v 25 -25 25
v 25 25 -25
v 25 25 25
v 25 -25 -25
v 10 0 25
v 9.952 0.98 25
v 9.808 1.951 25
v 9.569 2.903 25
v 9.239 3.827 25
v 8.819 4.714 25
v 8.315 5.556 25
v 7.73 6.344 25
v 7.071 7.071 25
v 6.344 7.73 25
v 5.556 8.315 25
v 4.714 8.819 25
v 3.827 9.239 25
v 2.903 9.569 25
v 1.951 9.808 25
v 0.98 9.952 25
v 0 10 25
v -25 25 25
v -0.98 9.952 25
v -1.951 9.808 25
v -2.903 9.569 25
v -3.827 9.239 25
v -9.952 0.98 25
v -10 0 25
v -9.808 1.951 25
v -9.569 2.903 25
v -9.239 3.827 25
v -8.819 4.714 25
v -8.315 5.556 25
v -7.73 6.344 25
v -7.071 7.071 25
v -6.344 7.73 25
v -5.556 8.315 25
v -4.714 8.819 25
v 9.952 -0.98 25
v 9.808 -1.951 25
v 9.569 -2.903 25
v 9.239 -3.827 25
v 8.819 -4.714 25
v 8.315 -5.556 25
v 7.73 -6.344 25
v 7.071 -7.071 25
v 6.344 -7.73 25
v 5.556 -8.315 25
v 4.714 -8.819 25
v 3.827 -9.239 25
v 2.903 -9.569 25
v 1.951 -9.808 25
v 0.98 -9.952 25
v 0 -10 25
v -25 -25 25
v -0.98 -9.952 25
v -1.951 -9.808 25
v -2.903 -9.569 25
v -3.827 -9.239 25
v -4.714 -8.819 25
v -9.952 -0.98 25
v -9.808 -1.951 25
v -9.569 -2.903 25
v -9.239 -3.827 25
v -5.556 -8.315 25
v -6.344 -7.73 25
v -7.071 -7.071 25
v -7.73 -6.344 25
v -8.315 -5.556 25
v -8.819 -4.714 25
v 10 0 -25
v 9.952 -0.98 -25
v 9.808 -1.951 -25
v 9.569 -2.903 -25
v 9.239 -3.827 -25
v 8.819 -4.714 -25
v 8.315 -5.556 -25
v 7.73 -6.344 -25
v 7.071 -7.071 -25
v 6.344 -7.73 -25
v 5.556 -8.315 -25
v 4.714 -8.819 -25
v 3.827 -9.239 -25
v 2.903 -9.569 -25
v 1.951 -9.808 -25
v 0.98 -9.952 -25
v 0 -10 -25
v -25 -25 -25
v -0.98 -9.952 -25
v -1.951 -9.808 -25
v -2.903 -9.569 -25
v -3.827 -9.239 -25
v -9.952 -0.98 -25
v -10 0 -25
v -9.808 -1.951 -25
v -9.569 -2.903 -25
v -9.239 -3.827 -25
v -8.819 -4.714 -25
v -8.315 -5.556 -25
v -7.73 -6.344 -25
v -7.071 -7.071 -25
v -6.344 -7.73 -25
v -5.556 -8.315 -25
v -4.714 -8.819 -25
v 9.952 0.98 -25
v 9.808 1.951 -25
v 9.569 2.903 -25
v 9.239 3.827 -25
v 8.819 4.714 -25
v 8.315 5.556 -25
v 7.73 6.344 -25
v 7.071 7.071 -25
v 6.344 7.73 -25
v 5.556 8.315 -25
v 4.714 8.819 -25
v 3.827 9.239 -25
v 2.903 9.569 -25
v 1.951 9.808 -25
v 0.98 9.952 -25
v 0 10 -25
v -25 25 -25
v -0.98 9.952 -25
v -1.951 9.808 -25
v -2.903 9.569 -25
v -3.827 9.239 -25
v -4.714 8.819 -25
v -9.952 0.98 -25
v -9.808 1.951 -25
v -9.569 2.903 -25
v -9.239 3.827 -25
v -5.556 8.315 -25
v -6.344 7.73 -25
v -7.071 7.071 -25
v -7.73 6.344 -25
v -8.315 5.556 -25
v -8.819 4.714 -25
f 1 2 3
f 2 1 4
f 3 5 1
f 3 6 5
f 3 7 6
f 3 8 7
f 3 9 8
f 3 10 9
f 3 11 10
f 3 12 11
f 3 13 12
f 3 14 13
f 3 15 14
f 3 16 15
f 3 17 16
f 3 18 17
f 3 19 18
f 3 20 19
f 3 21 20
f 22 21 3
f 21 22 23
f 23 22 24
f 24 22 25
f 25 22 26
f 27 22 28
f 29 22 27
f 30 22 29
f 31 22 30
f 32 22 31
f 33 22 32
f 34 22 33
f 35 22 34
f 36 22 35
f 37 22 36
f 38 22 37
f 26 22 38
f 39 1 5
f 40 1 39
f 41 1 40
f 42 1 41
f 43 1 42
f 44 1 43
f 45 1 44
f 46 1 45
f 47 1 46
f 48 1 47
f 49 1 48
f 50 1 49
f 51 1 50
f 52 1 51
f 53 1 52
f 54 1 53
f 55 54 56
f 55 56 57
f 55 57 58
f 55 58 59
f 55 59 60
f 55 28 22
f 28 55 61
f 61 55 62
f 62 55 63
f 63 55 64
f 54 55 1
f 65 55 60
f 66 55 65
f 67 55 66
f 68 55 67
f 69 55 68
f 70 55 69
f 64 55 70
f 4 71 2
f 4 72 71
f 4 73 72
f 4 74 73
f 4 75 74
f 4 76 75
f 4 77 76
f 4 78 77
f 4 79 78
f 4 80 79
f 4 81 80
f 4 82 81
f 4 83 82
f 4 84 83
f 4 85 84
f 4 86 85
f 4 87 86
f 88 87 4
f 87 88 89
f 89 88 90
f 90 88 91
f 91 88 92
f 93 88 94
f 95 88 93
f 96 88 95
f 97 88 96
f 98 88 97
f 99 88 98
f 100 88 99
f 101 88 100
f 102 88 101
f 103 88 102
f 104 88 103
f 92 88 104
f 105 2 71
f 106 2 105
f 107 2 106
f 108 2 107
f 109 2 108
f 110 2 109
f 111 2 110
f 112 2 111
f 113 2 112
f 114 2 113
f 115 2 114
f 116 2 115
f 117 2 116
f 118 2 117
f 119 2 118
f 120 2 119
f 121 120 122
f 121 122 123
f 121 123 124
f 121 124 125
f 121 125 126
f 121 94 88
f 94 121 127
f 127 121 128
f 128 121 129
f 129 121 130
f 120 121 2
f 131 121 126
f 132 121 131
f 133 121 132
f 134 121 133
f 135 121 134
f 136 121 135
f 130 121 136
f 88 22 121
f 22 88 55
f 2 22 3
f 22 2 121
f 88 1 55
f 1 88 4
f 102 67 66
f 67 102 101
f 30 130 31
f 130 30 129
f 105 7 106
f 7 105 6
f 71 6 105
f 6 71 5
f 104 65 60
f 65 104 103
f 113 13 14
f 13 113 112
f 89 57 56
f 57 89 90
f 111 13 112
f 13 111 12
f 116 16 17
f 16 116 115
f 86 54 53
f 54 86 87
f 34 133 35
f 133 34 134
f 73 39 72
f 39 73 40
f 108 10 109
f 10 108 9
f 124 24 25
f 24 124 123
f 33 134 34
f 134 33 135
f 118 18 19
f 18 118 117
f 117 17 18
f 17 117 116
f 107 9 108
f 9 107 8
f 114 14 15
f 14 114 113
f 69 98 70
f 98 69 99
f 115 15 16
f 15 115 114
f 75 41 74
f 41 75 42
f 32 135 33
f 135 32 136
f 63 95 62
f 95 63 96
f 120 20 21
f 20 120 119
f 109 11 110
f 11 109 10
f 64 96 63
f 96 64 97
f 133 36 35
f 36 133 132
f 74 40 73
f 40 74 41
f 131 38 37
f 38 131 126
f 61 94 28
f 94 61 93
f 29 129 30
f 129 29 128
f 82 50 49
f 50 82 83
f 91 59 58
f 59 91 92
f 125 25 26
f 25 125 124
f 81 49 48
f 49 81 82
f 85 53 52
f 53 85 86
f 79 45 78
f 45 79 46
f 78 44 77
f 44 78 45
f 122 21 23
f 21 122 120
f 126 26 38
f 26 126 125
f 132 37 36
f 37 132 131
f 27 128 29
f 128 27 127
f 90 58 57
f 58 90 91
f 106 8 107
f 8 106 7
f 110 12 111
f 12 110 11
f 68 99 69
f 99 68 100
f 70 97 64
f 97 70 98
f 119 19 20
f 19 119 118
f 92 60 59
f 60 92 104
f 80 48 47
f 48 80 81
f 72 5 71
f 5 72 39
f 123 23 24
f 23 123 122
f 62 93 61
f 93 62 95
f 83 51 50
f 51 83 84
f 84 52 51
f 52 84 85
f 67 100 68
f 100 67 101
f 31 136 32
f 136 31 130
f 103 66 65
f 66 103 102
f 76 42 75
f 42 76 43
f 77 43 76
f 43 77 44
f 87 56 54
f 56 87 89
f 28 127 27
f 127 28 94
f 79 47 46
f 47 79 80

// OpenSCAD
difference() {
    cube([50, 50, 50], center = true);
    cylinder(h = 52, d = 20, center = true, $fn = 64);
}
